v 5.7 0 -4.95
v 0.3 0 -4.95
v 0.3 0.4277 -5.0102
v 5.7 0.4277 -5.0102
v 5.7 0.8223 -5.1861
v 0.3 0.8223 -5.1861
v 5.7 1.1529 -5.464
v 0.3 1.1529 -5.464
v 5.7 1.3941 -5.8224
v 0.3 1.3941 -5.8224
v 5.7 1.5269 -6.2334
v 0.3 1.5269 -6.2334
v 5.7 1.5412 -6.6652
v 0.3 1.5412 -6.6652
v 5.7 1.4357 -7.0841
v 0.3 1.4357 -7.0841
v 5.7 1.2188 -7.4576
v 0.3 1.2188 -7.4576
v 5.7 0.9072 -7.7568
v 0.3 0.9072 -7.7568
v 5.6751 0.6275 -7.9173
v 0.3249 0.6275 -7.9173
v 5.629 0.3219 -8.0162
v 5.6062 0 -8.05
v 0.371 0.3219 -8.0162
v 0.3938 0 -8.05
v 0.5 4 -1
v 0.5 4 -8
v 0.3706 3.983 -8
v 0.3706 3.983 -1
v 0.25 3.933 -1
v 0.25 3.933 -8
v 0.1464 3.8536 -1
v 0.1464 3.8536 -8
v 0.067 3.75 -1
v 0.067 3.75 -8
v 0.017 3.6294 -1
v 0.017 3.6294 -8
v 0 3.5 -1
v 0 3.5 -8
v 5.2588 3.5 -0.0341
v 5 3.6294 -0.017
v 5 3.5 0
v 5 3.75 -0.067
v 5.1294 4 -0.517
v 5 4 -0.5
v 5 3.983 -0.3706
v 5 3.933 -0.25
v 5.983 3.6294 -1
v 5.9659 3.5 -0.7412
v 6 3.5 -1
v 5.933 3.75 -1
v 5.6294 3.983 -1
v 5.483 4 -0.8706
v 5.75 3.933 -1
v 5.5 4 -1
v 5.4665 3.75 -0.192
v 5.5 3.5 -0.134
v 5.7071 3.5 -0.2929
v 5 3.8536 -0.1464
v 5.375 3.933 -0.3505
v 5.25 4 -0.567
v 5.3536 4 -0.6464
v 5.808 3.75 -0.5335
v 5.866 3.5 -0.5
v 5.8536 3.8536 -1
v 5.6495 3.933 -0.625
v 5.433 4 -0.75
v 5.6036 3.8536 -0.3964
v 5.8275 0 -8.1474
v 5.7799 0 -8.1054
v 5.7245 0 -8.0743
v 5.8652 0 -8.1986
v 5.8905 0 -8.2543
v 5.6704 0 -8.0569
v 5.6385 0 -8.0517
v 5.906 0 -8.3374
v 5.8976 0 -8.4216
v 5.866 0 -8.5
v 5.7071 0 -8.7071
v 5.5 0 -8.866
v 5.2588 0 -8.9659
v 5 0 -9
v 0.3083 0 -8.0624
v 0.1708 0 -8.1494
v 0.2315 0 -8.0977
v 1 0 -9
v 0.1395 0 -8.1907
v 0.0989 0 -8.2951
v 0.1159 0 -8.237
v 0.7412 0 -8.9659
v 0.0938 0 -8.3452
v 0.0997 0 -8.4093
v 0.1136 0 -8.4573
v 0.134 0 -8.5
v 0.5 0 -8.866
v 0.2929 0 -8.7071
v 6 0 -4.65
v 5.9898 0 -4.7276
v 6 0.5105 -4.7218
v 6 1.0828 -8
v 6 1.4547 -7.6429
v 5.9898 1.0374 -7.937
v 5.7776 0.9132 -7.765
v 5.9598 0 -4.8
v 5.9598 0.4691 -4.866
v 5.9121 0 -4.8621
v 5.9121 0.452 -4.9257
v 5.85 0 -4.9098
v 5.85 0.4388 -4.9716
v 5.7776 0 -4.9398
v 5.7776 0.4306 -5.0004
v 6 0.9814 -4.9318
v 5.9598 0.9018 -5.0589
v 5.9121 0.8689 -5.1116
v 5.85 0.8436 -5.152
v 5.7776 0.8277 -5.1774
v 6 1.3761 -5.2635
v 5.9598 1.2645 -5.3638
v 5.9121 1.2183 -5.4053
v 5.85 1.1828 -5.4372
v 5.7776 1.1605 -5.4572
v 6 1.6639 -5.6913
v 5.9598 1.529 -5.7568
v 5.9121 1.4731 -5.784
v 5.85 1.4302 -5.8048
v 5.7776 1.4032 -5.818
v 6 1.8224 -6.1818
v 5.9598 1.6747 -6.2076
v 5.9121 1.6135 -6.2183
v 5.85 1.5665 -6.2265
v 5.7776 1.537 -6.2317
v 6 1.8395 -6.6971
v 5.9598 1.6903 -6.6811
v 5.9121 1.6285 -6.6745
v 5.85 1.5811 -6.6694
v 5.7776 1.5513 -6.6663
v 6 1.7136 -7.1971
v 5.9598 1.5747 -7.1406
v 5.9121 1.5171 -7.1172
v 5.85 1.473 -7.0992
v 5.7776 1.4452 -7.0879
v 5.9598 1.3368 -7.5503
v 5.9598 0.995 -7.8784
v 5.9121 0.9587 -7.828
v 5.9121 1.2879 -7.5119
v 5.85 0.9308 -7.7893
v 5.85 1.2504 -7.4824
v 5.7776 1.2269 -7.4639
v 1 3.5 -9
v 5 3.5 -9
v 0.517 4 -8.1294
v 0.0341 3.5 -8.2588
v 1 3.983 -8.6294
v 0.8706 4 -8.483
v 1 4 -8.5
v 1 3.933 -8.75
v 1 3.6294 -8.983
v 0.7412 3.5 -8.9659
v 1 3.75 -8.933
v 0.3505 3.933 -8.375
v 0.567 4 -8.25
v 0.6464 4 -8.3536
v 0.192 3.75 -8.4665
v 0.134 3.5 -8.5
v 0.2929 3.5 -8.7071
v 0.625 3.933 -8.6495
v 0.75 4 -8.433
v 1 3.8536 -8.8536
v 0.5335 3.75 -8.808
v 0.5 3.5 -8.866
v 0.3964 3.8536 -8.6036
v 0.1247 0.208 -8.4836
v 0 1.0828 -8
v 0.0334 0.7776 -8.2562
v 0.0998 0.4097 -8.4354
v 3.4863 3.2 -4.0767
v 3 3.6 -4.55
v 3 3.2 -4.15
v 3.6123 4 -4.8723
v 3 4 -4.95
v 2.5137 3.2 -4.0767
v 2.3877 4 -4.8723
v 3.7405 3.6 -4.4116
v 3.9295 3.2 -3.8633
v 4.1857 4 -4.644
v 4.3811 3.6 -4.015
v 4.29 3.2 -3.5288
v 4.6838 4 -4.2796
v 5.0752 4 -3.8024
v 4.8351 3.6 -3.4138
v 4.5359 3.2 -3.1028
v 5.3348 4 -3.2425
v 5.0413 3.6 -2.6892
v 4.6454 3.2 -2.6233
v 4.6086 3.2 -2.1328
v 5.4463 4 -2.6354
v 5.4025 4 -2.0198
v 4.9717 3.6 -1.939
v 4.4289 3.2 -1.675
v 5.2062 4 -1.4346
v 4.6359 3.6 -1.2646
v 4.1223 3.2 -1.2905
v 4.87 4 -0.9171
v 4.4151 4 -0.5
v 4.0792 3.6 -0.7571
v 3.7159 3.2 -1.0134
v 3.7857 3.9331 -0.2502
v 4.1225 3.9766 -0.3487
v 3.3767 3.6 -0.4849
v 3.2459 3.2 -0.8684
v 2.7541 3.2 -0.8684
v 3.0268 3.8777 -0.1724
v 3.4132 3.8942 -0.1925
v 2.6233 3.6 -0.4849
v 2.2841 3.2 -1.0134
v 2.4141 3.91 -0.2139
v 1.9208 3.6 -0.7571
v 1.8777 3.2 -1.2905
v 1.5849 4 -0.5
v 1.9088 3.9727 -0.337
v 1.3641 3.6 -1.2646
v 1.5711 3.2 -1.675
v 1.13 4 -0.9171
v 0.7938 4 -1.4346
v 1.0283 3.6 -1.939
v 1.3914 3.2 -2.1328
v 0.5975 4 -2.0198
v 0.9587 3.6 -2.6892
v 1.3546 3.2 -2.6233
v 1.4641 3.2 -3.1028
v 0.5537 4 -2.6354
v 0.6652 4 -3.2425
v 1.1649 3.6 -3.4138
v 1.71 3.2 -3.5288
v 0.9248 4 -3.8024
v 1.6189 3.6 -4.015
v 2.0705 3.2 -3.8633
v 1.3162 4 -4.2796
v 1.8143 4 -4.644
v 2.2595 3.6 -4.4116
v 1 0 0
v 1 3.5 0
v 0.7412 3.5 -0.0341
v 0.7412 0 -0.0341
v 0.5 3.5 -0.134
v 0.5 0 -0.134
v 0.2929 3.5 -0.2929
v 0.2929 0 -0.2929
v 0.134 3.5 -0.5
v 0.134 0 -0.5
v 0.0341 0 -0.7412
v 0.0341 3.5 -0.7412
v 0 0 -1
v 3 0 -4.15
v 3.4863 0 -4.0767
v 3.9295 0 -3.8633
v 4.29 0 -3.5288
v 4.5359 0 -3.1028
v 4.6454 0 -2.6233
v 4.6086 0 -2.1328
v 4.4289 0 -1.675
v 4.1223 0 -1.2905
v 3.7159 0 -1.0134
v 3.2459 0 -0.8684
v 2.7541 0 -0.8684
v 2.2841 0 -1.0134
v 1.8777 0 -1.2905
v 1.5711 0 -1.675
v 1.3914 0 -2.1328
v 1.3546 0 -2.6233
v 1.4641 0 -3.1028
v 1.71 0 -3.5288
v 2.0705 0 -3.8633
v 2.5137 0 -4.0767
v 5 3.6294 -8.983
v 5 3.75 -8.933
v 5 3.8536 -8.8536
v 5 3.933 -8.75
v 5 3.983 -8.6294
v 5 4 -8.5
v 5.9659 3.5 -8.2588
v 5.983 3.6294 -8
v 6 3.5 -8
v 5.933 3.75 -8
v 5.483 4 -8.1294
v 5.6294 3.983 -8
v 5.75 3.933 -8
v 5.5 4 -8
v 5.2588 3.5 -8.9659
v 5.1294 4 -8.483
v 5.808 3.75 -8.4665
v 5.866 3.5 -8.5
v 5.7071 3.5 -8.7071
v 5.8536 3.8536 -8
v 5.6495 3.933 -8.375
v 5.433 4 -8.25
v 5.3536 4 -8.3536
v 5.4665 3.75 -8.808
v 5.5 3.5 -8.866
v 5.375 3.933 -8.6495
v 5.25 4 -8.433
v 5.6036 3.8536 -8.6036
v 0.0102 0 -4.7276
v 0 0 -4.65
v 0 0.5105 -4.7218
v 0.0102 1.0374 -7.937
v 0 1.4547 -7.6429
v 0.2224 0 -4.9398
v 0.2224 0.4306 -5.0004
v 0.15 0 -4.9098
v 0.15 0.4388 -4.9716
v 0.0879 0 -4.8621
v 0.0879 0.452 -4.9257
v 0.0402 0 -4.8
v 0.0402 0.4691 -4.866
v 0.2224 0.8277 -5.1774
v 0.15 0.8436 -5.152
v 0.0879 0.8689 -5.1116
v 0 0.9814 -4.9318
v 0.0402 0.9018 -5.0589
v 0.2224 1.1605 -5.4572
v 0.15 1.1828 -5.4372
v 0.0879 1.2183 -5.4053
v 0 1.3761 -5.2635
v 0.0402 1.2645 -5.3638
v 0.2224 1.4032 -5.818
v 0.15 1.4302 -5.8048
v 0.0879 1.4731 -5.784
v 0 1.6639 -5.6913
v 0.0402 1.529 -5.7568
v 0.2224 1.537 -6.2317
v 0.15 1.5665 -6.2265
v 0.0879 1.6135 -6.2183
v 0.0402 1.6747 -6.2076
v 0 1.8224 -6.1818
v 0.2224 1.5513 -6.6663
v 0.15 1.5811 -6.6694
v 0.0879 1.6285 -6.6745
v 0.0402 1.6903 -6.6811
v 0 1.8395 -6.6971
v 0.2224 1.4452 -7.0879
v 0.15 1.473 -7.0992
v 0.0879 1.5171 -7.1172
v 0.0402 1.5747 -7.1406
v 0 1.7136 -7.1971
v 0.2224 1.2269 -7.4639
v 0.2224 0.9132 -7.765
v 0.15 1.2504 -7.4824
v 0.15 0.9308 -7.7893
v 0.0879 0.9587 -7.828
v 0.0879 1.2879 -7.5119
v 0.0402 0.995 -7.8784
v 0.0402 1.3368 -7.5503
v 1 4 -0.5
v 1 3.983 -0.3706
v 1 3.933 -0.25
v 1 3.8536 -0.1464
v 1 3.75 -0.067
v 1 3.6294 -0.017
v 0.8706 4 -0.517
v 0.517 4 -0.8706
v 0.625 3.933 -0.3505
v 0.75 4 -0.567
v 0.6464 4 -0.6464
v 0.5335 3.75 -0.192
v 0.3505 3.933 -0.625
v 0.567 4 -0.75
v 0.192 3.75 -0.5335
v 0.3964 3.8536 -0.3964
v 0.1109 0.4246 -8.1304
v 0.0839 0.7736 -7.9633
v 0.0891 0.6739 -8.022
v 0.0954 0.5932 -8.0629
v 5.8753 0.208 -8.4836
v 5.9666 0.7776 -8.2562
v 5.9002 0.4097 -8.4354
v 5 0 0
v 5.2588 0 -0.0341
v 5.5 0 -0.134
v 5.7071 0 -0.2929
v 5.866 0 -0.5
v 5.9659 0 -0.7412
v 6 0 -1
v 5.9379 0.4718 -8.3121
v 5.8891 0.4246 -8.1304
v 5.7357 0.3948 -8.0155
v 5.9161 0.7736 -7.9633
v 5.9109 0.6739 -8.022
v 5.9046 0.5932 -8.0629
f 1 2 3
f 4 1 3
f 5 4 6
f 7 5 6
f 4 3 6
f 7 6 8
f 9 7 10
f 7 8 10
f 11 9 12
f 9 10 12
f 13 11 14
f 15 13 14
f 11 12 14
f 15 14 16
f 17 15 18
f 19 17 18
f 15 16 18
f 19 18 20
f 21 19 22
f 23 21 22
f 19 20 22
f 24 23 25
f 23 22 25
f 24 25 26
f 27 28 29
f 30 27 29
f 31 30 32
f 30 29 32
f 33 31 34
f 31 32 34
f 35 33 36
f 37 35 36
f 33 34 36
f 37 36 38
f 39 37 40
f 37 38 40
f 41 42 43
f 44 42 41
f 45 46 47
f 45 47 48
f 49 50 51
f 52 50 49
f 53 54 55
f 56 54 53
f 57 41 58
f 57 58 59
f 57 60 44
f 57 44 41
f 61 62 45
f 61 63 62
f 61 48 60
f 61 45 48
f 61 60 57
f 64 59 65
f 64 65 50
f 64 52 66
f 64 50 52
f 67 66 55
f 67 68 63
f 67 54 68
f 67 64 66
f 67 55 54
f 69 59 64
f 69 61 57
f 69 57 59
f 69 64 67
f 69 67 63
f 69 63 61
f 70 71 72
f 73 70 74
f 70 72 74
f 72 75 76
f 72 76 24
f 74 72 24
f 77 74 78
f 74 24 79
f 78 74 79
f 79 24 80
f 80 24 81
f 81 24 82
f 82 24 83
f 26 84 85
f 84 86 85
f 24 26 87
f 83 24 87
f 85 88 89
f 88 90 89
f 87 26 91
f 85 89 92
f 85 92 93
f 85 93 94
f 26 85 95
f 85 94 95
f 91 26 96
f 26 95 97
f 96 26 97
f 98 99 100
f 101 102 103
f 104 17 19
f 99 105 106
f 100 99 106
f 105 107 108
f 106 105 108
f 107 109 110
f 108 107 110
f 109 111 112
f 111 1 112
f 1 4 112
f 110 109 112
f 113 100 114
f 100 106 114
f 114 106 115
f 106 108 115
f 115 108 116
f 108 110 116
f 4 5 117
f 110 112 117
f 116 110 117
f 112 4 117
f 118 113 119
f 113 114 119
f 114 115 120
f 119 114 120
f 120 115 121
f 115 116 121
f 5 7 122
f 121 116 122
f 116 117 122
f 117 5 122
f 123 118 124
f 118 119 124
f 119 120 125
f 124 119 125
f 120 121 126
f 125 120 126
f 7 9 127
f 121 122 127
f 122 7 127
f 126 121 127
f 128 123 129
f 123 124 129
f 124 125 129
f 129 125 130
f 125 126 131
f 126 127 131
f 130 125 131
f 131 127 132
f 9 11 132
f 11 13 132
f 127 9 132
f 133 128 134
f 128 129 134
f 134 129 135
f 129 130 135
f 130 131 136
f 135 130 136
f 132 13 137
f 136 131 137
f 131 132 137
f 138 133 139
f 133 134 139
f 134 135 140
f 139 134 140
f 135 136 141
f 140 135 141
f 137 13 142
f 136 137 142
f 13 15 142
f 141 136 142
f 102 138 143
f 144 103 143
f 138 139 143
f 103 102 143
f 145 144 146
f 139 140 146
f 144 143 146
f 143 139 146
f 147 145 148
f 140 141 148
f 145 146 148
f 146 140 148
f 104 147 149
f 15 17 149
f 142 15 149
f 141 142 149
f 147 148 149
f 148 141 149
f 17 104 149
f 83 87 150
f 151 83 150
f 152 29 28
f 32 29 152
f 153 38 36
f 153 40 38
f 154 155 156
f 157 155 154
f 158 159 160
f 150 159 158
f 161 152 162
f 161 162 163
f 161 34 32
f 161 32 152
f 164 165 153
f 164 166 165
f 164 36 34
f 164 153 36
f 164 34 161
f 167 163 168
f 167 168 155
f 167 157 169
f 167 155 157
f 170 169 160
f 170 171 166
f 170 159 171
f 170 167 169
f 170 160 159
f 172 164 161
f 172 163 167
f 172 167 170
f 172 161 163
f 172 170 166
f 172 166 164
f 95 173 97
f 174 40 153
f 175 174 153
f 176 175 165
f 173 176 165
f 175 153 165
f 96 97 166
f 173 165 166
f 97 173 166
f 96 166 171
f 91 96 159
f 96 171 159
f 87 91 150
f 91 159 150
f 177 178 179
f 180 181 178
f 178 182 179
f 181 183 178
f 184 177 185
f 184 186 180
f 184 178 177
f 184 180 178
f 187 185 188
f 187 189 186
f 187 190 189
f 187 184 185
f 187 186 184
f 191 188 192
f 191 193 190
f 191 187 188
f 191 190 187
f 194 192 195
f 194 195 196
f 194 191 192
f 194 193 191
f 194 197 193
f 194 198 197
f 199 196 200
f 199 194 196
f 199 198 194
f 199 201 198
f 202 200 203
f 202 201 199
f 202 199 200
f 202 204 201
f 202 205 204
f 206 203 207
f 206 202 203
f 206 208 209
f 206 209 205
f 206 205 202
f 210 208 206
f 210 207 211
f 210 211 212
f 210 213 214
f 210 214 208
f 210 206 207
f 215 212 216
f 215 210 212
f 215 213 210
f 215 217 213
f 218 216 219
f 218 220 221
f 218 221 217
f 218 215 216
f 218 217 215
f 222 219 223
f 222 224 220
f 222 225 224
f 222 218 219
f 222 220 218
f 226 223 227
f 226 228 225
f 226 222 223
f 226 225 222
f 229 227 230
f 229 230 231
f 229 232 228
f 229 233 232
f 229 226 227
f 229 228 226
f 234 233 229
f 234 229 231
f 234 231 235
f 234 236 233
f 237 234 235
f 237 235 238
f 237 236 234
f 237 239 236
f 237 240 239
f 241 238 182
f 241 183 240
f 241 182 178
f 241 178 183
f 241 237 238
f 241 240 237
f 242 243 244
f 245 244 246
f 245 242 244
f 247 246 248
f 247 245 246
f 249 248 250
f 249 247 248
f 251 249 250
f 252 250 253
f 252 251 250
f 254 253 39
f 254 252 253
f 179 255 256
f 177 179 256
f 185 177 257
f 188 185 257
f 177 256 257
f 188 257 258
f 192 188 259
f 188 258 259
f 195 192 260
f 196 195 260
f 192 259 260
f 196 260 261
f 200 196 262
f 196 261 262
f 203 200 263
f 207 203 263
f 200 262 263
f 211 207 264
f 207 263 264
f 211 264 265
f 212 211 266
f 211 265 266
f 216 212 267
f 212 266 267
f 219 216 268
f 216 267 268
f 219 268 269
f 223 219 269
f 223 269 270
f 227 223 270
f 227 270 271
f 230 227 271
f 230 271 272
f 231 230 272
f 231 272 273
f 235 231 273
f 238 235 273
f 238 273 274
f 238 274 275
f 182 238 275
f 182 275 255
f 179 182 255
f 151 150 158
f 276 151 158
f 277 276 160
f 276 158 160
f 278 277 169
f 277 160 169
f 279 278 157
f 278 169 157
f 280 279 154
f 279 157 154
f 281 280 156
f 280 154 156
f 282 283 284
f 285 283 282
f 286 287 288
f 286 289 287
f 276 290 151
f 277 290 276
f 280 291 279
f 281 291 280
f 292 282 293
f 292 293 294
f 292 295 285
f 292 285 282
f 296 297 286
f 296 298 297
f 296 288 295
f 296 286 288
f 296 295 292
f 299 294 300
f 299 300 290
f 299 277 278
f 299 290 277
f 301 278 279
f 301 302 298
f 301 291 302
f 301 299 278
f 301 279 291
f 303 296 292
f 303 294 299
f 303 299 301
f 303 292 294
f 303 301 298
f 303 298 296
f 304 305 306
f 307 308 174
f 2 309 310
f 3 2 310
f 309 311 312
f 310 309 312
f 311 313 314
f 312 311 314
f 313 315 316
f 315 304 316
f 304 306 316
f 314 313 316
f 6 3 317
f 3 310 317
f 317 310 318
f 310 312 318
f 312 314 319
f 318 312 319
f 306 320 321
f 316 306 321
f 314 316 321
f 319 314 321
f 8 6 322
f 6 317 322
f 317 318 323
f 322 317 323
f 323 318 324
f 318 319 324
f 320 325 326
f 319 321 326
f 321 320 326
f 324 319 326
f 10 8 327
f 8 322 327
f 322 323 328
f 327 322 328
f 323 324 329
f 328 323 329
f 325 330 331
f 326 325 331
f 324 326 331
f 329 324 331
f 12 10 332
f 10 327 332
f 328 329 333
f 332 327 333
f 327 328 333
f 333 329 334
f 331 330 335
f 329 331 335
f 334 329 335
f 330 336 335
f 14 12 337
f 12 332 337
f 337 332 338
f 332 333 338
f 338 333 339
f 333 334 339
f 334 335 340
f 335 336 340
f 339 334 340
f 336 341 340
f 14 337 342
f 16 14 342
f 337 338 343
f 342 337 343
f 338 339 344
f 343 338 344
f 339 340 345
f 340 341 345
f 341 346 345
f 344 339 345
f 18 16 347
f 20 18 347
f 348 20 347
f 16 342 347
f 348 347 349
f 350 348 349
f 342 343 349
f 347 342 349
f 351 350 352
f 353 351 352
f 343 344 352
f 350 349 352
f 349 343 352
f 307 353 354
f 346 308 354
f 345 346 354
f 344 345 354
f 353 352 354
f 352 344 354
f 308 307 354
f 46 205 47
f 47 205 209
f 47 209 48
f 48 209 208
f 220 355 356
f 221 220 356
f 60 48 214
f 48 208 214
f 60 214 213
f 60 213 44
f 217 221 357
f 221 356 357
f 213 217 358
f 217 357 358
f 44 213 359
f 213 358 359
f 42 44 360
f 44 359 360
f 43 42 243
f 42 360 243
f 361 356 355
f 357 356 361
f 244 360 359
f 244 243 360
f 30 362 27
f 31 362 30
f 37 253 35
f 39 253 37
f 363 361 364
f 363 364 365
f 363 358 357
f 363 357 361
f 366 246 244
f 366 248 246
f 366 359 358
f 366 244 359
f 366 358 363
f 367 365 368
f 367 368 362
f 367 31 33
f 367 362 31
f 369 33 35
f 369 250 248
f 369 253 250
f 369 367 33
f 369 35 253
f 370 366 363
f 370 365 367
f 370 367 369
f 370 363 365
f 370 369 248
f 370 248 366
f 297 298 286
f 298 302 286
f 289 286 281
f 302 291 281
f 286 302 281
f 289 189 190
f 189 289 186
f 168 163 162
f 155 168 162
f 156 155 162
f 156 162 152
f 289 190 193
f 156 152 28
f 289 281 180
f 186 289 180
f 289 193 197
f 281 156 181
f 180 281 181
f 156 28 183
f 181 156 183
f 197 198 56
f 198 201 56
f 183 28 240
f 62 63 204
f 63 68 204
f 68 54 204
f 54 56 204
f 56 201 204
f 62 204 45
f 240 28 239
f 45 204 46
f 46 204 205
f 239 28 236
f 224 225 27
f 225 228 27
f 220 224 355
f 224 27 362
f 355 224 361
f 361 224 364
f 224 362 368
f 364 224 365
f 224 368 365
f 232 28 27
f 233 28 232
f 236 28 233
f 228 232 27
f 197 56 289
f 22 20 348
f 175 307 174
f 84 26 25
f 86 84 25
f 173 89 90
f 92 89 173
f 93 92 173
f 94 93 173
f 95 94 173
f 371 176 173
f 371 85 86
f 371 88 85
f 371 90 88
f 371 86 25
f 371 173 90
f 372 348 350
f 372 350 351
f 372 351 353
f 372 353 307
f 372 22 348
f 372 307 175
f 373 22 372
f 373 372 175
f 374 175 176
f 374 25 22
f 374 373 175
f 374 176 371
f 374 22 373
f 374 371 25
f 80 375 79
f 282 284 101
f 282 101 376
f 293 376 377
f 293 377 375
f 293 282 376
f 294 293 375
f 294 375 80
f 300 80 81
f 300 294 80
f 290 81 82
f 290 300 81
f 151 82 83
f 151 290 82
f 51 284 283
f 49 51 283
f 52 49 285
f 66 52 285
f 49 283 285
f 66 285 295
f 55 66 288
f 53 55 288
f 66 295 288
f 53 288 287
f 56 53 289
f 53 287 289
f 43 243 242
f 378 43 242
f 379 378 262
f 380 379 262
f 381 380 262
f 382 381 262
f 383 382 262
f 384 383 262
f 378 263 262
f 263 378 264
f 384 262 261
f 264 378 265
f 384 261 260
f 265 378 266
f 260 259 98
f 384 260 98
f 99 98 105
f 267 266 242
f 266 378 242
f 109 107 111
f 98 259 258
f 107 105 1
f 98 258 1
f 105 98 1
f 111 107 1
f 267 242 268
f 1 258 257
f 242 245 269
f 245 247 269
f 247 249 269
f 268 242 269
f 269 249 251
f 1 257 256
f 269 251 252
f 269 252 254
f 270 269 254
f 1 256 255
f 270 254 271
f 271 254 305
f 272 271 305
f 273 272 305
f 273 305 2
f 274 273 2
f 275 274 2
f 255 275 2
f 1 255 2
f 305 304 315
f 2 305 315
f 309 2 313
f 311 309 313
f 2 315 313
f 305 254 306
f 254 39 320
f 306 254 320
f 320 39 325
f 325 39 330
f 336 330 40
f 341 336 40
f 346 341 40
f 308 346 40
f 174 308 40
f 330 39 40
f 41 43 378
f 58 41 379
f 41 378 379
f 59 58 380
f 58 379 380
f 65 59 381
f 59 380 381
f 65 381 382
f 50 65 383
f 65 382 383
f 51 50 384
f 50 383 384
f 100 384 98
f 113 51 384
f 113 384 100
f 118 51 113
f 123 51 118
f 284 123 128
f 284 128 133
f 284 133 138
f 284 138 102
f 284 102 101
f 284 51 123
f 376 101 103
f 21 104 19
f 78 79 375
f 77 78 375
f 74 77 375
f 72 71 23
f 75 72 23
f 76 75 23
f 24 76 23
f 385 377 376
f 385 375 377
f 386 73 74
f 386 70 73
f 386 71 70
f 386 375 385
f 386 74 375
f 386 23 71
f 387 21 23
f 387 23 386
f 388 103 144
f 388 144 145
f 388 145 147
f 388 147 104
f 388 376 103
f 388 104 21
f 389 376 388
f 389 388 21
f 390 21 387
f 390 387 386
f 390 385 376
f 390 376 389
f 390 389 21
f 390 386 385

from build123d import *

# Parameters (mm, degrees)
EXTRUDE_1_DEPTH     = 6
SKETCH_2_R          = 1.65
CUT_EXTRUDE_1_DEPTH = 6
FILLET_1_R          = 1
CHAMFER_1_SIZE      = 0.8
FILLET_2_R          = 0.5
FILLET_3_R          = 0.3


with BuildPart() as part:
    # 草圖1 → 填料-伸長1 (new body)
    with BuildSketch(Plane(origin=(0, 0, 0), x_dir=(0, 0, -1), z_dir=(1, 0, 0))):
        with BuildLine():
            Line((0, 0), (4.95, 0))
            ThreePointArc((4.95, 0), (6.5, 1.55), (8.05, 0))
            Line((8.05, 0), (9, 0))
            Line((9, 0), (9, 4))
            Line((9, 4), (0, 4))
            Line((0, 4), (0, 0))
        make_face()
    extrude(amount=EXTRUDE_1_DEPTH)

    # 草圖2 → 除料-伸長1 (cut)
    with BuildSketch(Plane(origin=(0, 0, 0), x_dir=(-1, 0, 0), z_dir=(0, -1, 0))):
        with Locations(Location((-3, 2.5, 0), (0, 0, 90))):
            Circle(SKETCH_2_R)
    extrude(amount=-CUT_EXTRUDE_1_DEPTH, mode=Mode.SUBTRACT)

    # 圓角1
    fillet_1_edges = [part.edges().sort_by_distance(p)[0] for p in [
        (6, 2, -9),
        (6, 2, 0),
        (0, 2, -9),
        (0, 2, 0),
    ]]
    fillet(fillet_1_edges, radius=FILLET_1_R)

    # 導角1
    chamfer_1_edges = [part.edges().sort_by_distance(p)[0] for p in [
        (3, 4, -0.85),
    ]]
    chamfer(chamfer_1_edges, length=CHAMFER_1_SIZE)

    # 圓角2
    # the kernel refuses this fillet: 0.5 mm, written as the material it takes off along each edge
    with BuildSketch(Plane(origin=(6, 4, -8), x_dir=(-1, 0, 0), z_dir=(0, 0, 1))) as fillet_2_piece_1:
        with BuildLine():
            CenterArc((FILLET_2_R, FILLET_2_R), FILLET_2_R, 180, 90)
            Line((0, FILLET_2_R), (0, 0))
            Line((0, 0), (FILLET_2_R, 0))
        make_face()
    extrude(amount=7, mode=Mode.SUBTRACT)
    with BuildSketch(Plane(origin=(0, 4, -8), x_dir=(1, 0, 0), z_dir=(0, 0, 1))) as fillet_2_piece_2:
        with BuildLine():
            CenterArc((FILLET_2_R, -FILLET_2_R), FILLET_2_R, 90, 90)
            Line((0, -FILLET_2_R), (0, 0))
            Line((0, 0), (FILLET_2_R, 0))
        make_face()
    extrude(amount=7, mode=Mode.SUBTRACT)
    with BuildSketch(Plane(origin=(1, 4, 0), x_dir=(0, 0, -1), z_dir=(1, 0, 0))) as fillet_2_piece_3:
        with BuildLine():
            CenterArc((FILLET_2_R, -FILLET_2_R), FILLET_2_R, 90, 90)
            Line((0, -FILLET_2_R), (0, 0))
            Line((0, 0), (FILLET_2_R, 0))
        make_face()
    extrude(amount=4, mode=Mode.SUBTRACT)
    with BuildSketch(Plane(origin=(1, 4, -9), x_dir=(0, 0, 1), z_dir=(1, 0, 0))) as fillet_2_piece_4:
        with BuildLine():
            CenterArc((FILLET_2_R, FILLET_2_R), FILLET_2_R, 180, 90)
            Line((0, FILLET_2_R), (0, 0))
            Line((0, 0), (FILLET_2_R, 0))
        make_face()
    extrude(amount=4, mode=Mode.SUBTRACT)
    with BuildSketch(Plane(origin=(1, 4, -1), x_dir=(0, 0, 1), z_dir=(1, 0, 0))) as fillet_2_piece_5:
        with BuildLine():
            CenterArc((1 - FILLET_2_R, FILLET_2_R), FILLET_2_R, 270, 90)
            Line((1, FILLET_2_R), (1, 0))
            Line((1, 0), (1 - FILLET_2_R, 0))
        make_face()
    revolve(axis=Axis((1, 4, -1), (0, -1, 0)), revolution_arc=90, mode=Mode.SUBTRACT)
    with BuildSketch(Plane(origin=(5, 4, -1), x_dir=(0, 0, 1), z_dir=(-1, 0, 0))) as fillet_2_piece_6:
        with BuildLine():
            CenterArc((1 - FILLET_2_R, -FILLET_2_R), FILLET_2_R, 0, 90)
            Line((1, -FILLET_2_R), (1, 0))
            Line((1, 0), (1 - FILLET_2_R, 0))
        make_face()
    revolve(axis=Axis((5, 4, -1), (0, 1, 0)), revolution_arc=90, mode=Mode.SUBTRACT)
    with BuildSketch(Plane(origin=(1, 4, -8), x_dir=(-1, 0, 0), z_dir=(0, 0, 1))) as fillet_2_piece_7:
        with BuildLine():
            CenterArc((1 - FILLET_2_R, FILLET_2_R), FILLET_2_R, 270, 90)
            Line((1, FILLET_2_R), (1, 0))
            Line((1, 0), (1 - FILLET_2_R, 0))
        make_face()
    revolve(axis=Axis((1, 4, -8), (0, -1, 0)), revolution_arc=90, mode=Mode.SUBTRACT)
    with BuildSketch(Plane(origin=(5, 4, -8), x_dir=(1, 0, 0), z_dir=(0, 0, 1))) as fillet_2_piece_8:
        with BuildLine():
            CenterArc((1 - FILLET_2_R, -FILLET_2_R), FILLET_2_R, 0, 90)
            Line((1, -FILLET_2_R), (1, 0))
            Line((1, 0), (1 - FILLET_2_R, 0))
        make_face()
    revolve(axis=Axis((5, 4, -8), (0, 1, 0)), revolution_arc=90, mode=Mode.SUBTRACT)

    # 圓角3
    fillet_3_edges = [part.edges().sort_by_distance(p)[0] for p in [
        (6, 1.537449186, -6.303149803),
        (0.000701488, 0.196850436, -8.037449158),
        (5.999298512, 0.196850436, -8.037449158),
        (0, 1.537449186, -6.303149803),
    ]]
    fillet(fillet_3_edges, radius=FILLET_3_R)


solid = part.part
